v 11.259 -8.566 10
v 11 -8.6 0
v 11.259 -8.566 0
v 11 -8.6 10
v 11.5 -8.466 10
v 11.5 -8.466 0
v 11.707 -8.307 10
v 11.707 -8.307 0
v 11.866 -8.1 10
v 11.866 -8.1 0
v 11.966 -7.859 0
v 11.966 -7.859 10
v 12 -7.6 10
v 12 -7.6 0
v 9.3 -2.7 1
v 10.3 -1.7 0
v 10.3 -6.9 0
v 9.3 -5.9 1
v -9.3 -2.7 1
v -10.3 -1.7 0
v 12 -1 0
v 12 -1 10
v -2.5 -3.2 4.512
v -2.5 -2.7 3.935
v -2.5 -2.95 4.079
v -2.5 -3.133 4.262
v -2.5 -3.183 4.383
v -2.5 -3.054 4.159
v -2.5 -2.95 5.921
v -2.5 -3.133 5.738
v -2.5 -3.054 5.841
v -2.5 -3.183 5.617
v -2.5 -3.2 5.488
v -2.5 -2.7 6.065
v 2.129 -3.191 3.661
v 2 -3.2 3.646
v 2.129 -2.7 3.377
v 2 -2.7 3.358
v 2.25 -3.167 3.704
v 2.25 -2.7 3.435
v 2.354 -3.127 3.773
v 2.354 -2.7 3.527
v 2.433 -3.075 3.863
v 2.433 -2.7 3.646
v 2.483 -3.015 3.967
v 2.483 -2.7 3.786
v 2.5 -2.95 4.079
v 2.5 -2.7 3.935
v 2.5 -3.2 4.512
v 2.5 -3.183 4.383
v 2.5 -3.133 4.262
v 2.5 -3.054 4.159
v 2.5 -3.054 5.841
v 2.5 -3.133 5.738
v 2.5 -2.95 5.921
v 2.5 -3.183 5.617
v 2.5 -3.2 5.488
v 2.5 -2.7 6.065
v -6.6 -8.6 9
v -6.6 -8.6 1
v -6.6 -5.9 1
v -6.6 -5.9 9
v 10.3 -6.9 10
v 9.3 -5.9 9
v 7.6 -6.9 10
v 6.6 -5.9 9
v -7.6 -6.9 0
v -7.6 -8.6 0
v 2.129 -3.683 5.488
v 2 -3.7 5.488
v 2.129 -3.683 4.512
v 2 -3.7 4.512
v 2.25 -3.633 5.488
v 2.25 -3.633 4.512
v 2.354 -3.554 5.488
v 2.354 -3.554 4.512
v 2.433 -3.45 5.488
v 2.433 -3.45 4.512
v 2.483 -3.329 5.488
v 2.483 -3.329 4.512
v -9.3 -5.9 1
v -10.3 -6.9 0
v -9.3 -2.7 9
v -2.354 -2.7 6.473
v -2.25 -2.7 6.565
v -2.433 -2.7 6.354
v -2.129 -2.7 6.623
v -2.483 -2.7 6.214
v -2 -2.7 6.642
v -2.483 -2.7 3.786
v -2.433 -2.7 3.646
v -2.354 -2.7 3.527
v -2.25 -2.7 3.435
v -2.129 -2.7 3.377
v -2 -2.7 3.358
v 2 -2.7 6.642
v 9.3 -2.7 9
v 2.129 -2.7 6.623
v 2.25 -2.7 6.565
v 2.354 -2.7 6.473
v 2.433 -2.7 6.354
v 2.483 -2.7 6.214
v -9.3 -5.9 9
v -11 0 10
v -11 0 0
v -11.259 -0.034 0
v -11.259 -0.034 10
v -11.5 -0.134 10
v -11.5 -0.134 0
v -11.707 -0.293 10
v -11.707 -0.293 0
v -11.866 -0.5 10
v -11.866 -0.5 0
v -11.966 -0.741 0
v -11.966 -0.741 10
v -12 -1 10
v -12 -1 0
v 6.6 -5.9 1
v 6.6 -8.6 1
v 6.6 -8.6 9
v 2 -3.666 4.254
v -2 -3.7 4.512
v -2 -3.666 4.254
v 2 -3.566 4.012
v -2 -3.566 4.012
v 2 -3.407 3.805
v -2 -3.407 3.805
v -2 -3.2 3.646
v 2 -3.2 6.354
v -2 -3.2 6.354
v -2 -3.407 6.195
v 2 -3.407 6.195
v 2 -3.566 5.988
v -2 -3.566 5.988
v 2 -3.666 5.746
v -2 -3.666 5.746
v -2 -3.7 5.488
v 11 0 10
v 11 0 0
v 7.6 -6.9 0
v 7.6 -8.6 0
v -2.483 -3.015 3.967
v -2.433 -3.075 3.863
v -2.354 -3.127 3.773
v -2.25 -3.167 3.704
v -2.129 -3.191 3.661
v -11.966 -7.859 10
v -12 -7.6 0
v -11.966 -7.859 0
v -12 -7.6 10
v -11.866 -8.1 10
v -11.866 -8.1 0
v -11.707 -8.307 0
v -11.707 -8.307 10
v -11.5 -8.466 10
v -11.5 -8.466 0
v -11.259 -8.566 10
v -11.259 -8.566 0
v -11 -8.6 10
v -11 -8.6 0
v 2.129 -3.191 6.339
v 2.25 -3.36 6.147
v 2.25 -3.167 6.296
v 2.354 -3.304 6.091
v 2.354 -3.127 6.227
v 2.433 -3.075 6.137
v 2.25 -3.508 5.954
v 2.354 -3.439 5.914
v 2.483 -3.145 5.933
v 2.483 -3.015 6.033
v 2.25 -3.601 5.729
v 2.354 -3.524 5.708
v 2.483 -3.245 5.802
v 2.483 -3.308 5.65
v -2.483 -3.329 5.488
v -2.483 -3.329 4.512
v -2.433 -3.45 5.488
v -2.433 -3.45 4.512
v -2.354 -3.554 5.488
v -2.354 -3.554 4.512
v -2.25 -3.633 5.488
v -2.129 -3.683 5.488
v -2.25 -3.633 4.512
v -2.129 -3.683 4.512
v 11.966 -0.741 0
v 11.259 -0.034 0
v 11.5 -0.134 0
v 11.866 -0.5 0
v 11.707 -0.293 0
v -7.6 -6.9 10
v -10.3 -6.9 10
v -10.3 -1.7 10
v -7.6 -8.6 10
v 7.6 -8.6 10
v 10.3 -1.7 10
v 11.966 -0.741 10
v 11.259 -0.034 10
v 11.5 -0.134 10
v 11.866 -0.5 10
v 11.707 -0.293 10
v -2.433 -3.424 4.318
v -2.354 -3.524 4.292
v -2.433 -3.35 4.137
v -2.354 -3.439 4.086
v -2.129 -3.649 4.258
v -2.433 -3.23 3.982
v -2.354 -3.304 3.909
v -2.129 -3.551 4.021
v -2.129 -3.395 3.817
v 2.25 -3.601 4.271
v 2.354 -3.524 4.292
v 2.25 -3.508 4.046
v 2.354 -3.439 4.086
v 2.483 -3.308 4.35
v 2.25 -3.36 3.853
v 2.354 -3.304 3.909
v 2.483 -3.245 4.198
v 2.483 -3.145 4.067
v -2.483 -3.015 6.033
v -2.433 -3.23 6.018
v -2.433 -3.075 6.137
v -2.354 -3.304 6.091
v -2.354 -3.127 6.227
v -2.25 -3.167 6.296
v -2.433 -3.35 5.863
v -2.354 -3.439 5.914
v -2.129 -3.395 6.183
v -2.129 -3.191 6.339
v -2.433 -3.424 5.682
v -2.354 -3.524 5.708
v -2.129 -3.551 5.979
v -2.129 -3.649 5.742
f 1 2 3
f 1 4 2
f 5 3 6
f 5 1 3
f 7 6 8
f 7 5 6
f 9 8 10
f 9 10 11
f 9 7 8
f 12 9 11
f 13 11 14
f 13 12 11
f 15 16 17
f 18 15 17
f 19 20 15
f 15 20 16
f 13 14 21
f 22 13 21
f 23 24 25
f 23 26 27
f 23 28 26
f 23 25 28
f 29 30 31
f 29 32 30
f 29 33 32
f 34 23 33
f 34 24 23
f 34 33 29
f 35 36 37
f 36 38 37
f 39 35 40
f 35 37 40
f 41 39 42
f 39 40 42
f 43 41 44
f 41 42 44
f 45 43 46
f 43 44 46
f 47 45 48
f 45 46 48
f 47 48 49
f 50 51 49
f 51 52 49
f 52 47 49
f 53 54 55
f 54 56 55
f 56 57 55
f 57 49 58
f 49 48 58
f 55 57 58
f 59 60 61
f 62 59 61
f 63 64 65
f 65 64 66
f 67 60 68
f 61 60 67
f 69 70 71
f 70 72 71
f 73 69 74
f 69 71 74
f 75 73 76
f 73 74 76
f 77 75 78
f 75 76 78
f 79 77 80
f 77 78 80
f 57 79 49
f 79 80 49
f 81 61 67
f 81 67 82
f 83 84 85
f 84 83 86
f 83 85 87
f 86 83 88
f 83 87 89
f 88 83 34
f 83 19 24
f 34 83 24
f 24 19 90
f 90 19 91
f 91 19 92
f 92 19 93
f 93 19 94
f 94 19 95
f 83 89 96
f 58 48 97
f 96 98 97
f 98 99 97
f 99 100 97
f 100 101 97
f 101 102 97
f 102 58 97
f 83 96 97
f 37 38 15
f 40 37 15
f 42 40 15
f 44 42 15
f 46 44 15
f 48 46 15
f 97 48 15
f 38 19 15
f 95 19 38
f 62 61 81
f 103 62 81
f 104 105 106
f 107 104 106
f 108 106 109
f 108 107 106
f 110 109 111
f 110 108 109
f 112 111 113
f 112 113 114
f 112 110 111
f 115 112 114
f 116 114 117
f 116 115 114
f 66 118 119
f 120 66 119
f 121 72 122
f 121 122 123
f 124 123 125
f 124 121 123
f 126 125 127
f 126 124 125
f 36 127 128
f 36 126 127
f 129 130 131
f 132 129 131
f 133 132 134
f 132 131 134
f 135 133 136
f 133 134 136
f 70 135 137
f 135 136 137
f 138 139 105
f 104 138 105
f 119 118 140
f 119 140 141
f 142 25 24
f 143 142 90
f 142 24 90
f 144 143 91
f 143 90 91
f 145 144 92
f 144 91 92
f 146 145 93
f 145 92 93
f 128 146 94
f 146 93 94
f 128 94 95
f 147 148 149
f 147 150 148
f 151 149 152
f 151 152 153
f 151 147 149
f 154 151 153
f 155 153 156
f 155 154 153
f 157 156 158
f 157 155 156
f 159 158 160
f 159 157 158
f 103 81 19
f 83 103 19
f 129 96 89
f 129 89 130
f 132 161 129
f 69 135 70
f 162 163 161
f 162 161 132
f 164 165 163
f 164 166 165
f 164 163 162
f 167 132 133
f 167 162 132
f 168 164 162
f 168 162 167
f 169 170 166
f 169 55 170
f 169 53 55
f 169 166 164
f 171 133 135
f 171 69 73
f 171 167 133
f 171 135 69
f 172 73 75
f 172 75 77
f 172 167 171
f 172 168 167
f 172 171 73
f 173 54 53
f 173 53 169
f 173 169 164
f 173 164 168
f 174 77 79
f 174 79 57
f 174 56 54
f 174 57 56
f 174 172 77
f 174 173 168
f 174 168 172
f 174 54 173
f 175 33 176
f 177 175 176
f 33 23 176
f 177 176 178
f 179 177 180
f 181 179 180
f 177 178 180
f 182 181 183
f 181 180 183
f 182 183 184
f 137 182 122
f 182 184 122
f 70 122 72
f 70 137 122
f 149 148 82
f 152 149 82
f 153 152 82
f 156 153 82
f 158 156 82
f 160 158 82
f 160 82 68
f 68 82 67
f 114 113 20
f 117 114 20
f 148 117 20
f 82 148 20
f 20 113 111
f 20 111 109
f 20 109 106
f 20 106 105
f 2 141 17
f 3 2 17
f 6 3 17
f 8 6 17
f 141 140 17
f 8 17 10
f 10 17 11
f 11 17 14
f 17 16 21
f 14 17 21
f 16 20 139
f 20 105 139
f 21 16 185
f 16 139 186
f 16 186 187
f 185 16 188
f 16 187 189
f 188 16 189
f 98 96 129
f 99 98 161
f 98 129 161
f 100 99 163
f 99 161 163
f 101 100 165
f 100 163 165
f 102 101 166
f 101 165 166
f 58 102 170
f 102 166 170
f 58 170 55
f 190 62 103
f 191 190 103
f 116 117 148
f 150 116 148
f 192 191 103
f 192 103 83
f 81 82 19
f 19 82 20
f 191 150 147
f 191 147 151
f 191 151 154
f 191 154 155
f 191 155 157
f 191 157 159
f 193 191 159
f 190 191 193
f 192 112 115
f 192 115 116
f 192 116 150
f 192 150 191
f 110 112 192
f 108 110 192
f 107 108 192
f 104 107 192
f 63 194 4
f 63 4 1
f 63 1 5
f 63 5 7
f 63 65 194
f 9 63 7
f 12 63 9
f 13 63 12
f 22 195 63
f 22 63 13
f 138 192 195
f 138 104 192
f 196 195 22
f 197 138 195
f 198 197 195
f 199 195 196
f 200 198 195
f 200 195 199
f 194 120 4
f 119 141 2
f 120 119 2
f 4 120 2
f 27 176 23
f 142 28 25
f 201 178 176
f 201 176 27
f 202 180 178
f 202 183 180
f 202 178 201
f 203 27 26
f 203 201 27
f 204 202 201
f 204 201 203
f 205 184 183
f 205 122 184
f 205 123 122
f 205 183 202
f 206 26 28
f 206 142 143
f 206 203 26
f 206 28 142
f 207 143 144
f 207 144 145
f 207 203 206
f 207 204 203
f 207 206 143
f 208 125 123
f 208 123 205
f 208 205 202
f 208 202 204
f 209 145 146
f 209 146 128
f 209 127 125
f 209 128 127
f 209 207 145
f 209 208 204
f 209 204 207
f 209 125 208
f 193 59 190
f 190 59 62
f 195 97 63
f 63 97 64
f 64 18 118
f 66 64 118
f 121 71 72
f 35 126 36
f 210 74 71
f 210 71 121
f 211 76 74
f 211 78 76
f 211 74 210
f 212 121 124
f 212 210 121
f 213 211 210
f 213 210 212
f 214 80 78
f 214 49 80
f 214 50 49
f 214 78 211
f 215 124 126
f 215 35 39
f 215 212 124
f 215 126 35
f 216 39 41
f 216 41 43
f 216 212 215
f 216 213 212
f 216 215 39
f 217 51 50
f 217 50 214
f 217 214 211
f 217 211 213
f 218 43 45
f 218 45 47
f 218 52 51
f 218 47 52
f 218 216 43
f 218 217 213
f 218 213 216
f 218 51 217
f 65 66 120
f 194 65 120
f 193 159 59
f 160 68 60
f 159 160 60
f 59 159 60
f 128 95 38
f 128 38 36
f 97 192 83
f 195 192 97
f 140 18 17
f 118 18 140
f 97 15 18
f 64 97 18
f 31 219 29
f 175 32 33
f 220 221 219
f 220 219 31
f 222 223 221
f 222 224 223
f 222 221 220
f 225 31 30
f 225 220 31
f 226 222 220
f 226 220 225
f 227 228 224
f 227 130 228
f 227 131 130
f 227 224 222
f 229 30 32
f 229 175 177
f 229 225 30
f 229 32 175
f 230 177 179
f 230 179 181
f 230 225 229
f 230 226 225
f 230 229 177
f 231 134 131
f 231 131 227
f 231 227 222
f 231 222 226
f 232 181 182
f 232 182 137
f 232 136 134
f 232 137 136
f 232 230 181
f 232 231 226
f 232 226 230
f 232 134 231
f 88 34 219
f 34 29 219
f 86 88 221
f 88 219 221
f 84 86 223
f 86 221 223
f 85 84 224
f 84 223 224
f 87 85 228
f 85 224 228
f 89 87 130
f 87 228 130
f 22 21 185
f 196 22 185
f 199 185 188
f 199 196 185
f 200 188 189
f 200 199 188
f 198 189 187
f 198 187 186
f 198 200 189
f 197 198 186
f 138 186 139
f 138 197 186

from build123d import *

# Parameters (mm, degrees)
F1_DEPTH    = 10
F2_W        = 5
F2_H        = 3.4
F3_DEPTH    = 1
F4_T4_DEPTH = 10.6915886602
F4_T9_DEPTH = 10.6915886602
F5_R        = 1
F6_R        = 0.5
F7_SIZE     = 1
F8_R        = 1


# Not quite as in the source:
# - a fillet or chamfer that OpenCascade refuses, or shapes differently, is made with other operations: its cross-section is extruded or revolved along the edge and cut away or added


with BuildPart() as f1:
    # F0 (on Top) → F1 (new body)
    with BuildSketch(Plane.XY):
        Polygon((-6.6, -5.9), (-9.3, -5.9), (-9.3, -2.7), (0, -2.7), (9.3, -2.7), (9.3, -5.9), (6.6, -5.9), (6.6, -8.6), (12, -8.6), (12, 0), (0, 0), (-12, 0), (-12, -8.6), (-6.6, -8.6), align=None)
    extrude(amount=F1_DEPTH)

    # F2 (on face) → F3 (join)
    with BuildSketch(Plane.XZ.offset(2.7)):
        with Locations((0, 5)):
            Rectangle(F2_W, F2_H)
    extrude(amount=F3_DEPTH)

    # F4: chamfer of 1.1 x 0.6350852961 on 2 edges, made by hand


with BuildPart() as f4_tool2:
    # F4_s3 → F4_t4 (new body)
    with BuildSketch(Plane.YZ.offset(5.3457943301)):
        Polygon((-2.6, 6.7), (-3.7, 6.0649147039), (-3.7, 6.7), align=None)
    extrude(amount=-F4_T4_DEPTH)

    split(bisect_by=Plane.XZ.offset(2.7), keep=Keep.TOP)


with BuildPart() as f1_1:
    add(f1.part)

    # F4_t1: cut F4_tool2
    add(f4_tool2.part, mode=Mode.SUBTRACT)


with BuildPart() as f4_tool7:
    # F4_s8 → F4_t9 (new body)
    with BuildSketch(Plane.YZ.offset(-5.3457943301)):
        Polygon((-2.6, 3.3), (-3.7, 3.9350852961), (-3.7, 3.3), align=None)
    extrude(amount=F4_T9_DEPTH)

    split(bisect_by=Plane.XZ.offset(2.7), keep=Keep.TOP)


with BuildPart() as f1_2:
    add(f1_1.part)

    # F4_t6: cut F4_tool7
    add(f4_tool7.part, mode=Mode.SUBTRACT)

    # F5
    f5_edges = [f1_2.edges().sort_by_distance(p)[0] for p in [
        (0, -3.7, 3.935085),
        (0, -3.7, 6.064915),
    ]]
    fillet(f5_edges, radius=F5_R)

    # F6
    f6_edges = [f1_2.edges().sort_by_distance(p)[0] for p in [
        (2.5, -3.566025, 4.012436),
        (2.5, -3.566025, 5.987564),
        (-2.5, -3.566025, 4.012436),
        (-2.5, -3.566025, 5.987564),
        (2.5, -2.95, 6.497927),
        (-2.5, -2.95, 6.497927),
        (2.5, -3.7, 5),
        (2.5, -2.95, 3.502073),
        (-2.5, -2.95, 3.502073),
        (-2.5, -3.7, 5),
    ]]
    fillet(f6_edges, radius=F6_R)

    # F7
    f7_edges = [f1_2.edges().sort_by_distance(p)[0] for p in [
        (-9.3, -4.3, 0),
        (0, -2.7, 0),
        (-7.95, -5.9, 0),
        (-6.6, -7.25, 0),
        (9.3, -4.3, 0),
        (7.95, -5.9, 0),
        (6.6, -7.25, 0),
        (-9.3, -4.3, 10),
        (-7.95, -5.9, 10),
        (-6.6, -7.25, 10),
        (0, -2.7, 10),
        (9.3, -4.3, 10),
        (7.95, -5.9, 10),
        (6.6, -7.25, 10),
    ]]
    chamfer(f7_edges, length=F7_SIZE)

    # F8
    f8_edges = [f1_2.edges().sort_by_distance(p)[0] for p in [
        (-12, -8.6, 5),
        (12, -8.6, 5),
        (-12, 0, 5),
        (12, 0, 5),
    ]]
    fillet(f8_edges, radius=F8_R)


solid = f1_2.part
